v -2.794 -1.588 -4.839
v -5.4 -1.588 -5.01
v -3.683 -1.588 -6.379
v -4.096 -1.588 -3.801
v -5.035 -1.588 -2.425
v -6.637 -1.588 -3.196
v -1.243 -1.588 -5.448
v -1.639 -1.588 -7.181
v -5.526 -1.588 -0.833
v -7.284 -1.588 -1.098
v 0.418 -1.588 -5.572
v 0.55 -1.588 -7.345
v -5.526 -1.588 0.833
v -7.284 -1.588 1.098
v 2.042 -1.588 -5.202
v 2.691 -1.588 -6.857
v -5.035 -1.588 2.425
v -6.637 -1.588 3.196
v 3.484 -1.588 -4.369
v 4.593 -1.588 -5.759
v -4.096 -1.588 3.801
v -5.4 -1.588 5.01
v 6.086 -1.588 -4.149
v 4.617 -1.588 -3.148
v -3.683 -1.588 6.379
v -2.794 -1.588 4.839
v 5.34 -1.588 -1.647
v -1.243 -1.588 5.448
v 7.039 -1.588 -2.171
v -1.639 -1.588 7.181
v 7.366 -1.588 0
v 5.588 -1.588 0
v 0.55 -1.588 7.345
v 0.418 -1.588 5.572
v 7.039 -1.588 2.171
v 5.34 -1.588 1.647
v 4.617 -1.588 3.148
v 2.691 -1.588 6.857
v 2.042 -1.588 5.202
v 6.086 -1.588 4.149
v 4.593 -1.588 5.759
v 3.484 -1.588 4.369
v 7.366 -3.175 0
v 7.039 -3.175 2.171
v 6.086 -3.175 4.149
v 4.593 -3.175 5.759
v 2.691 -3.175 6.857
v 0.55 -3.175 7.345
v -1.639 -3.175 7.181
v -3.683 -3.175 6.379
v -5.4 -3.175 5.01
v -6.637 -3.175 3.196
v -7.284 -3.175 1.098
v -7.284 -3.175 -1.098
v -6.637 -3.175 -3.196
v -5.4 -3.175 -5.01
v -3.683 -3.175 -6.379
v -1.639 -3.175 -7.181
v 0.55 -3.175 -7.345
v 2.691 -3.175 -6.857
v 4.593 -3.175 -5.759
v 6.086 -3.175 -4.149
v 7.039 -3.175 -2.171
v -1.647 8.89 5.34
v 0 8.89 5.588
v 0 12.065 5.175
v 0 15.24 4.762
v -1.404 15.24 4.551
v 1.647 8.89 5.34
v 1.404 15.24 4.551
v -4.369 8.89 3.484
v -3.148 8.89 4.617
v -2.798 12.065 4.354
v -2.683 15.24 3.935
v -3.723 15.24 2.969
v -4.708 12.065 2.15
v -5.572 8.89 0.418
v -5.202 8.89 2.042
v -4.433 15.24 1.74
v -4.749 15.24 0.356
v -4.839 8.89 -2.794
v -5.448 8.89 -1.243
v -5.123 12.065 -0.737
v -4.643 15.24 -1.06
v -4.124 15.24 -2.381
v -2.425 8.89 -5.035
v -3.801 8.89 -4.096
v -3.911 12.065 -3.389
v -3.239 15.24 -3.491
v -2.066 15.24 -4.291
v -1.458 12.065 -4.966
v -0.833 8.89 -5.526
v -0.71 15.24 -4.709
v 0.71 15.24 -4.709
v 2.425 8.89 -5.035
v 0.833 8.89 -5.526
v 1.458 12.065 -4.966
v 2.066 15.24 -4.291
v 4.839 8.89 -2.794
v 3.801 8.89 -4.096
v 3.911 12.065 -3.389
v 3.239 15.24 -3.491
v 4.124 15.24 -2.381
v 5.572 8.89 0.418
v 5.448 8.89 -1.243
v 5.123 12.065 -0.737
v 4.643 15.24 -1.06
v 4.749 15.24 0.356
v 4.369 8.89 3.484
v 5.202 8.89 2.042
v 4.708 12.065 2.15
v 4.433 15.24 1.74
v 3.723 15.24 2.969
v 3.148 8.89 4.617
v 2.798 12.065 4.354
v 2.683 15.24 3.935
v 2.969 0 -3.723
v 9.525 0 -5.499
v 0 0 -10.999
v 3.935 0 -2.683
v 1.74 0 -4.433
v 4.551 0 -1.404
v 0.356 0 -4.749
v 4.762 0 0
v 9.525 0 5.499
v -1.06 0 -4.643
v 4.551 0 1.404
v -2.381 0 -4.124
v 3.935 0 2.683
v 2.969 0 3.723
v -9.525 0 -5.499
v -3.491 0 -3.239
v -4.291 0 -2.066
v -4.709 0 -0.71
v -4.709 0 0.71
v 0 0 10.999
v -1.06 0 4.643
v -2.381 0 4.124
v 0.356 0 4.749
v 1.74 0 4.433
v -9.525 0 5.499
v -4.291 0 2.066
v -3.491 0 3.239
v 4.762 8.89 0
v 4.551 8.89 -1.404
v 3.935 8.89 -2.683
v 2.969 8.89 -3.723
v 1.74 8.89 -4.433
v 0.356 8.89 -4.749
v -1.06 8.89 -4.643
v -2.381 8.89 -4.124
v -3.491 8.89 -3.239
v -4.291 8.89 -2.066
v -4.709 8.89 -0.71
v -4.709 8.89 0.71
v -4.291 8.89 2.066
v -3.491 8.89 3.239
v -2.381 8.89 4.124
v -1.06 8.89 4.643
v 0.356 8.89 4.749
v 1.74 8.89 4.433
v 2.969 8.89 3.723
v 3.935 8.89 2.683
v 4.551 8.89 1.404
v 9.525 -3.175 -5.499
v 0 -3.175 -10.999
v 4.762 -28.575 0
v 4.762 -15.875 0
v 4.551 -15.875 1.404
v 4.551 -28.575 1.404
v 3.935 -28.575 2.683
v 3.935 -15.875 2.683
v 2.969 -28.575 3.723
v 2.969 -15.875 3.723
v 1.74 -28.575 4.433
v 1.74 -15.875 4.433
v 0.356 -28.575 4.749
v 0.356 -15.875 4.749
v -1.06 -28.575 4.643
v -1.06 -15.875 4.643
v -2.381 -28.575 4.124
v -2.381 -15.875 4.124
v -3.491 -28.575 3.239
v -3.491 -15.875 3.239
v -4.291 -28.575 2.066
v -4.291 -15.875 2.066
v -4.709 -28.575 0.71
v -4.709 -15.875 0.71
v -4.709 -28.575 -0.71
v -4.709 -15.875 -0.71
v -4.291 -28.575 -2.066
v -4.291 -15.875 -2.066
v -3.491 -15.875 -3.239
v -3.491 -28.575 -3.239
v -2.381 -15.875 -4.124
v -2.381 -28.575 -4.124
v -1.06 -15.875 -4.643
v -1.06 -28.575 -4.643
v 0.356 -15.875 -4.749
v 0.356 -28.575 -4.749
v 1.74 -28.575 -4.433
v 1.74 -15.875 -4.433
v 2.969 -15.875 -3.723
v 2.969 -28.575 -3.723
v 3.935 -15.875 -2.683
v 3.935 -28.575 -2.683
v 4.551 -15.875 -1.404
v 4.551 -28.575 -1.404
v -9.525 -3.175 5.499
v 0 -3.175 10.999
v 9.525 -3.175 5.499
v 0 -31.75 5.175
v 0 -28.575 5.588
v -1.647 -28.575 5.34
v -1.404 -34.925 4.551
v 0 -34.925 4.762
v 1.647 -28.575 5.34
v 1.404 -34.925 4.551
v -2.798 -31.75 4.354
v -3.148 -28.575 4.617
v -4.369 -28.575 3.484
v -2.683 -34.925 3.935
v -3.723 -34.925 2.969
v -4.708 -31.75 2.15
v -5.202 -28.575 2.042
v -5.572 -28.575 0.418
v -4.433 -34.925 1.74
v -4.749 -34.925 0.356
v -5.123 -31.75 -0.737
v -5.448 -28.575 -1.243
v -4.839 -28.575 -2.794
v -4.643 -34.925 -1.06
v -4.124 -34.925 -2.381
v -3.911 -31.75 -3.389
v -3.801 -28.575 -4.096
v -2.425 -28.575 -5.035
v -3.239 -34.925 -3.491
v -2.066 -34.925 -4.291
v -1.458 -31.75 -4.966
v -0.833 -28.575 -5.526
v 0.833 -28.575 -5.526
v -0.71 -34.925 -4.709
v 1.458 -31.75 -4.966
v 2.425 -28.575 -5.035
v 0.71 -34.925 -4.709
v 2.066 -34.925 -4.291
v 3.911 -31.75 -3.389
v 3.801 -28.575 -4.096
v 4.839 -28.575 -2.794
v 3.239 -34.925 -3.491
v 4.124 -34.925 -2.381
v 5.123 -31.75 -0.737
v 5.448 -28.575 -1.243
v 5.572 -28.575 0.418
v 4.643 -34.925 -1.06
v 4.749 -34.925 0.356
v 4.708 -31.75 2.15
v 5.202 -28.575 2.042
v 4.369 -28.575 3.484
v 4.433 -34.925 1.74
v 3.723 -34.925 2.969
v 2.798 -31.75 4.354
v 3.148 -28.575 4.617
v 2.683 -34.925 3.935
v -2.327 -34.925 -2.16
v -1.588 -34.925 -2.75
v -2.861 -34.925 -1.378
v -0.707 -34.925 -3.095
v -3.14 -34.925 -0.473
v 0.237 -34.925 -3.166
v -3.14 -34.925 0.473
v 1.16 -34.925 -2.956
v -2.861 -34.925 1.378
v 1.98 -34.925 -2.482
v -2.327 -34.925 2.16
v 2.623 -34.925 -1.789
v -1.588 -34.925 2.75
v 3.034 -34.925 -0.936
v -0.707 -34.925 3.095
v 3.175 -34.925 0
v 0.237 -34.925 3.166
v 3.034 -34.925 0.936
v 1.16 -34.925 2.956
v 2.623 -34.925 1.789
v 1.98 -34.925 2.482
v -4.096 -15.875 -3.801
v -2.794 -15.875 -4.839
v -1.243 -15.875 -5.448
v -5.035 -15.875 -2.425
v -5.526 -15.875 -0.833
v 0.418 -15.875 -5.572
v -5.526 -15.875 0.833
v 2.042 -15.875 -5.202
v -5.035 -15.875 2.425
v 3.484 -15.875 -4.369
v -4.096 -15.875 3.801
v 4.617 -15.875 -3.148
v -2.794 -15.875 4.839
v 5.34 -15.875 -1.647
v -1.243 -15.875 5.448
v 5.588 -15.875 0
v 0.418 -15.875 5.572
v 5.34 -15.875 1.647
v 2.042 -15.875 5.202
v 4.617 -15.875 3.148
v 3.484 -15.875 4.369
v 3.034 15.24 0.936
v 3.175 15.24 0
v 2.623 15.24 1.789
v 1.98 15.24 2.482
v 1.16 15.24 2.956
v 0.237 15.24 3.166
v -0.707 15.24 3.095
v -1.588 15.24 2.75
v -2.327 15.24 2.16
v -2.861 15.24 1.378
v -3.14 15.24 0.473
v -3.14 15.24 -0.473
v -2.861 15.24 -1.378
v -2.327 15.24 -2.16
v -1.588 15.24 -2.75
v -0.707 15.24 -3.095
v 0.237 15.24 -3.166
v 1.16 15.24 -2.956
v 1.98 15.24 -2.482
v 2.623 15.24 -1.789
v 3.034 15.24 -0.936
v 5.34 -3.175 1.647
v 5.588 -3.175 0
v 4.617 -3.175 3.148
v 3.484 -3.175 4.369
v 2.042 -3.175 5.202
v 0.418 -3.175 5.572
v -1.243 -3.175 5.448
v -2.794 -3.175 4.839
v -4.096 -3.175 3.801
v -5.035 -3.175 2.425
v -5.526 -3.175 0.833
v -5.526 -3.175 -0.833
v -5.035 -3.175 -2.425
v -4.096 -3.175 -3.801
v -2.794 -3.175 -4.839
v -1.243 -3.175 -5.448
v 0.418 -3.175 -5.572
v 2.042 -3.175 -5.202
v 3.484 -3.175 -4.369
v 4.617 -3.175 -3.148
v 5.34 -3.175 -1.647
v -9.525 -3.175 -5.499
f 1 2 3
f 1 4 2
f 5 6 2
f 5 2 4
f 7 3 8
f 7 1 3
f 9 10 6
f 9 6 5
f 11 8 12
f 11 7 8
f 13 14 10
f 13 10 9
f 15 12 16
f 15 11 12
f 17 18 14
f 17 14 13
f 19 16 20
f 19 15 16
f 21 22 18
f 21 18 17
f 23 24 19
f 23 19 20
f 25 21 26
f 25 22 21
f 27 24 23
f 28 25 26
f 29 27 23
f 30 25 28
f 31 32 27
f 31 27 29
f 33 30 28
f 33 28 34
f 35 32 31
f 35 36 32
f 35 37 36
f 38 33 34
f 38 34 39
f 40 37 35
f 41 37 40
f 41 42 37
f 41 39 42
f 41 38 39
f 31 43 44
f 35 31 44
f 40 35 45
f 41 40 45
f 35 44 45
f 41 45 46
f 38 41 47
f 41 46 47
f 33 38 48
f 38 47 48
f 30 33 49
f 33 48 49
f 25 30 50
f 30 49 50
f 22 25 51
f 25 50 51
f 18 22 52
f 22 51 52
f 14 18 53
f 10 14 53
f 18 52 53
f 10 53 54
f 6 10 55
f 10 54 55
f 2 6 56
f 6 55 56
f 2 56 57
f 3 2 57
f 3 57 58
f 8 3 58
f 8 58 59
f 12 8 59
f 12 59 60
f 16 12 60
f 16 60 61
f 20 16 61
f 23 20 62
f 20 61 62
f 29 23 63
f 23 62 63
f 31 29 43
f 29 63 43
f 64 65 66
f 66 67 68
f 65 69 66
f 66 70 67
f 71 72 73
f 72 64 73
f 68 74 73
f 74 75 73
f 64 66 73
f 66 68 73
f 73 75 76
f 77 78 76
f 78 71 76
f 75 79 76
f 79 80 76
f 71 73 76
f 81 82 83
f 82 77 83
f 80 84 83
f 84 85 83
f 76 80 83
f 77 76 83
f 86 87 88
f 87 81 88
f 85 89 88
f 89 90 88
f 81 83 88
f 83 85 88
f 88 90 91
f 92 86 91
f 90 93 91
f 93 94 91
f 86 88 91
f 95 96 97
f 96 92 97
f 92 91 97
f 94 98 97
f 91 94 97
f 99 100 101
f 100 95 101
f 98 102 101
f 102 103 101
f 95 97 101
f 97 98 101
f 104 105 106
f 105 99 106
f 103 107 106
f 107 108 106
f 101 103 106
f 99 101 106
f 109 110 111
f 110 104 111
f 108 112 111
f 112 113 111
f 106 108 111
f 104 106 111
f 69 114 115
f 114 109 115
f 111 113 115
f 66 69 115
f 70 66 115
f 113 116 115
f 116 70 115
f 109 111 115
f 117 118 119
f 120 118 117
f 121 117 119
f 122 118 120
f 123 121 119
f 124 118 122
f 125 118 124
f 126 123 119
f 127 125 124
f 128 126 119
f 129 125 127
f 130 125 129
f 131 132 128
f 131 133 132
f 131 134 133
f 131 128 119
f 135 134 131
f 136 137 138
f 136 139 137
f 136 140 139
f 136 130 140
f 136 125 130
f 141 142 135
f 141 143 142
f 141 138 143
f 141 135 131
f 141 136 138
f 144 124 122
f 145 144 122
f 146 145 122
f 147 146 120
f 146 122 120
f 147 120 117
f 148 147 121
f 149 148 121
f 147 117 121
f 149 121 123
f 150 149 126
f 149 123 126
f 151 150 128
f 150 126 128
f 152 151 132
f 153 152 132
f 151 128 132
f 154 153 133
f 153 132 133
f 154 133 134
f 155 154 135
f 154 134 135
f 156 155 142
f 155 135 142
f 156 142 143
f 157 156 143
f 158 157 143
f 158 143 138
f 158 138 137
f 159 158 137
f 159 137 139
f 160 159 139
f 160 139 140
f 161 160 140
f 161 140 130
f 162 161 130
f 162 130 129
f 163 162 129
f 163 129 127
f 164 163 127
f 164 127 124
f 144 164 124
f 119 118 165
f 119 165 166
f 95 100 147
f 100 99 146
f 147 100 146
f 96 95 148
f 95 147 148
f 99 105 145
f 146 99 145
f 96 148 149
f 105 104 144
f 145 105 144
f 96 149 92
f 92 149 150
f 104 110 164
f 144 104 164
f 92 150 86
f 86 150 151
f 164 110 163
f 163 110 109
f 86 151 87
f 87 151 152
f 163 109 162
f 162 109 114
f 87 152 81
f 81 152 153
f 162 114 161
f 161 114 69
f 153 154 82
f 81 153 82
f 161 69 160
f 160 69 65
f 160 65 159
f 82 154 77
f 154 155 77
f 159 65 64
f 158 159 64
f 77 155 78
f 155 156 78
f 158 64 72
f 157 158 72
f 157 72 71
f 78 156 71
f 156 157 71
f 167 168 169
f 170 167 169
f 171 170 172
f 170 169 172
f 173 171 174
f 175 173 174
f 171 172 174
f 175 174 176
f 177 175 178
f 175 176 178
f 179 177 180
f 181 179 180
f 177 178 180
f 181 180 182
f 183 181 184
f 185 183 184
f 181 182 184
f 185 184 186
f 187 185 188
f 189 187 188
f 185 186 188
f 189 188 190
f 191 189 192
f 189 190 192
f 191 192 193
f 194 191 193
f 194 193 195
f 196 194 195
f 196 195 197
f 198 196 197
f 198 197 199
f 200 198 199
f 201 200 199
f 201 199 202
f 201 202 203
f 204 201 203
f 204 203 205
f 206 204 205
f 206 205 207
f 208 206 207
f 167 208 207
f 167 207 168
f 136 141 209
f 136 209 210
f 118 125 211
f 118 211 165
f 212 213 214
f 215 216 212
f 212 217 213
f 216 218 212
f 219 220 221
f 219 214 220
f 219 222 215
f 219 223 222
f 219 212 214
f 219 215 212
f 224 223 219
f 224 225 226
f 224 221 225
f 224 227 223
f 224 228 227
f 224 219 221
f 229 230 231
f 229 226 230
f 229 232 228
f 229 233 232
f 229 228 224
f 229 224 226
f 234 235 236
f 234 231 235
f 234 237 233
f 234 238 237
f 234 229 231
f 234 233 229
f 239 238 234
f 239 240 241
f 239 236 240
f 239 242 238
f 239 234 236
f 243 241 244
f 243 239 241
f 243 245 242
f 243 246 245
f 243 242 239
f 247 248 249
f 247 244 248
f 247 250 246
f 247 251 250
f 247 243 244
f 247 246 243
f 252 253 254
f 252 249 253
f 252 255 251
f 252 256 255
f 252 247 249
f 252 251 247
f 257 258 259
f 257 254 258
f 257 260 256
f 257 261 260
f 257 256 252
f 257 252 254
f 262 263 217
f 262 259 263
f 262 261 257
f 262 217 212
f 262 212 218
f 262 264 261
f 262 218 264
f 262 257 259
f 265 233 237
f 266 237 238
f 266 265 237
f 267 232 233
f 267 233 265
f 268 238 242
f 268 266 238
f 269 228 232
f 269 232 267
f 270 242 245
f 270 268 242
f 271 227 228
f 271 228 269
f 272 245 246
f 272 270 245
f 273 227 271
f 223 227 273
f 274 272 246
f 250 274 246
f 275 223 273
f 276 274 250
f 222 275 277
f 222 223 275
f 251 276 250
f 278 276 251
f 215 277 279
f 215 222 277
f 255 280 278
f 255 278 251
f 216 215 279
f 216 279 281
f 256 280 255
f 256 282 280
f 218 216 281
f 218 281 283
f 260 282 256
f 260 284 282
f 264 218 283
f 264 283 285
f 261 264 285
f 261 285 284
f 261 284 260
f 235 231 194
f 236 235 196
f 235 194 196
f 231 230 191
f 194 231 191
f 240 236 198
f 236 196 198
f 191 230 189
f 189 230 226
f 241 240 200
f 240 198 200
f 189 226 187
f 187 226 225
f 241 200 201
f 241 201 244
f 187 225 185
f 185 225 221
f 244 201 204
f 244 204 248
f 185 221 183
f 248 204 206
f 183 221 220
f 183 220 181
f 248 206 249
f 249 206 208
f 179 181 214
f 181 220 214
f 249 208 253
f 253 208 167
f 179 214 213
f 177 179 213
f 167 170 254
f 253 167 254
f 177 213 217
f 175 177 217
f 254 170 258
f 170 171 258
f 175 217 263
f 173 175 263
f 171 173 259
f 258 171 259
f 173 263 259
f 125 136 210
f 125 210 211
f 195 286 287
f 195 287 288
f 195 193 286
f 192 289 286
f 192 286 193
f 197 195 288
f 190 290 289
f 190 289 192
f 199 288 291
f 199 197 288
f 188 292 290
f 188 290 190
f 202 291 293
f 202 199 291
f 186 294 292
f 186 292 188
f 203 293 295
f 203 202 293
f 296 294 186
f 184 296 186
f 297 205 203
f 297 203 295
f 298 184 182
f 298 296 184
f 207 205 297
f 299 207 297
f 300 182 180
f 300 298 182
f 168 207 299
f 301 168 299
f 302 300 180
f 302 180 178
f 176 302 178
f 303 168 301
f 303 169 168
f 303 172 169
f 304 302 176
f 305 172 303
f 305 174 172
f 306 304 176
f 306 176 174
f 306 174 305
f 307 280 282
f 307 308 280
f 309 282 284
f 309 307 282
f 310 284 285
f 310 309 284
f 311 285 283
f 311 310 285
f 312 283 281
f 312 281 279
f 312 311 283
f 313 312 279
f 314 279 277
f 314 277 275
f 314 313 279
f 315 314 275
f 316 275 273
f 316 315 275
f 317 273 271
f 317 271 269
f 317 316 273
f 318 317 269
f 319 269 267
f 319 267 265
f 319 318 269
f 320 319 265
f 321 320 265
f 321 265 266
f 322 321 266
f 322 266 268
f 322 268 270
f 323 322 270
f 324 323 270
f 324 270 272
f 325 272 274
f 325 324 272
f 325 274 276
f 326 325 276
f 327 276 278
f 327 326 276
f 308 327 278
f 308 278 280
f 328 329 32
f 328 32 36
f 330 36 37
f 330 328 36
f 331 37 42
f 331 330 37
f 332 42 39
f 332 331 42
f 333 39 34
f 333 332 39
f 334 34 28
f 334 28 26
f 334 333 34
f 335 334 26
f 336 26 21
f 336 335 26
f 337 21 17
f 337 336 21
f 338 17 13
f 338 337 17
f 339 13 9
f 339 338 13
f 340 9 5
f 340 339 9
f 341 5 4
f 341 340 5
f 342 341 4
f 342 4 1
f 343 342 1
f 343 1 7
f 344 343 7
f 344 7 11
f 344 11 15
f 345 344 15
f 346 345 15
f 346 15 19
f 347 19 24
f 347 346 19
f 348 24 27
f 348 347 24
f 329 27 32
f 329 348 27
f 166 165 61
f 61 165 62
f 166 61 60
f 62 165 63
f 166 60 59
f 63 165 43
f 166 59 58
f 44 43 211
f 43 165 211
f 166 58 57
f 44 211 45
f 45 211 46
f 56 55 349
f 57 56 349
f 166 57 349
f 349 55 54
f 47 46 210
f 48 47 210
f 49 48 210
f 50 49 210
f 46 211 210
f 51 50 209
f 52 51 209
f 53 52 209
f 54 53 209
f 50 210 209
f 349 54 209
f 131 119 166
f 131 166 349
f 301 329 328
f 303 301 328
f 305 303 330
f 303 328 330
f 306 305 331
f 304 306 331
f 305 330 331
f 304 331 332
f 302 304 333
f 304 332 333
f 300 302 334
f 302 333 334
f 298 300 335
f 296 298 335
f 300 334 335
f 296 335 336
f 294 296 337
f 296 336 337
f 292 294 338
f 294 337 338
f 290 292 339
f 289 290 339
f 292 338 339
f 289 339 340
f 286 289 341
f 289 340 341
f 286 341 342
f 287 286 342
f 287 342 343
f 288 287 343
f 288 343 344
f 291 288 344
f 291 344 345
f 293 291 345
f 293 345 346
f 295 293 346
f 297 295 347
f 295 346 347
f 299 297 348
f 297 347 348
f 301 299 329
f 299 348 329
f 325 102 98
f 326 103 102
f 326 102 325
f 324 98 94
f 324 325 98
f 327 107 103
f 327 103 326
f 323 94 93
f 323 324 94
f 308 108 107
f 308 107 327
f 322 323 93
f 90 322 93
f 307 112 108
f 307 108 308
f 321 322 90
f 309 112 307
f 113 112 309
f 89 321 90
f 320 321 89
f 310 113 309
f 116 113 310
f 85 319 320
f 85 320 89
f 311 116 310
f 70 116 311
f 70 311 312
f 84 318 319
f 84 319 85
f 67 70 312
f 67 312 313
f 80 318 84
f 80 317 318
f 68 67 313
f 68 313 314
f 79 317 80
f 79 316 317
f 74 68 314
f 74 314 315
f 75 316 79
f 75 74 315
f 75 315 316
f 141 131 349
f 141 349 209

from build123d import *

# Parameters (mm, degrees)
SKETCH1_R          = 4.7625
SKETCH1_R_2        = 3.175
EXTRUDE1_DEPTH     = 15.24
SKETCH2_R          = 3.175
EXTRUDE2_DEPTH     = 3.175
SKETCH3_R          = 4.7625
SKETCH3_R_2        = 3.175
EXTRUDE3_DEPTH     = 31.75
SKETCH4_R          = 7.366
SKETCH4_R_2        = 5.588
CUT_EXTRUDE1_DEPTH = 1.5875
SKETCH5_R          = 5.588
SKETCH5_R_2        = 4.7625
EXTRUDE4_DEPTH     = 6.35
SKETCH8_R          = 5.588
SKETCH8_R_2        = 4.7625
EXTRUDE5_DEPTH     = 6.35
SKETCH9_R          = 5.588
SKETCH9_R_2        = 4.7625
EXTRUDE6_DEPTH     = 12.7


with BuildPart() as part:
    # Sketch1 → Extrude1 (new body)
    with BuildSketch(Plane(origin=(0, 0, 0), x_dir=(1, 0, 0), z_dir=(0, 1, 0))):
        Circle(SKETCH1_R)
        Circle(SKETCH1_R_2, mode=Mode.SUBTRACT)
    extrude(amount=EXTRUDE1_DEPTH)

    # Sketch2 → Extrude2 (add)
    with BuildSketch(Plane.XZ):
        Polygon((9.525, 5.499261314), (9.525, -5.499261314), (0, -10.998522628), (-9.525, -5.499261314), (-9.525, 5.499261314), (0, 10.998522628), align=None)
        Circle(SKETCH2_R, mode=Mode.SUBTRACT)
    extrude(amount=EXTRUDE2_DEPTH)

    # Sketch3 → Extrude3 (add)
    with BuildSketch(Plane.XZ.offset(3.175)):
        Circle(SKETCH3_R)
        Circle(SKETCH3_R_2, mode=Mode.SUBTRACT)
    extrude(amount=EXTRUDE3_DEPTH)

    # Sketch4 → Cut-Extrude1 (cut)
    with BuildSketch(Plane.XZ.offset(3.175)):
        Circle(SKETCH4_R)
        Circle(SKETCH4_R_2, mode=Mode.SUBTRACT)
    extrude(amount=-CUT_EXTRUDE1_DEPTH, mode=Mode.SUBTRACT)

    # Sketch5 → Extrude4 (add)
    with BuildSketch(Plane(origin=(0, 15.24, 0), x_dir=(-1, 0, 0), z_dir=(0, 1, 0))):
        Circle(SKETCH5_R)
        Circle(SKETCH5_R_2, mode=Mode.SUBTRACT)
    extrude(amount=-EXTRUDE4_DEPTH)

    # Sketch8 → Extrude5 (add)
    with BuildSketch(Plane.XZ.offset(34.925)):
        Circle(SKETCH8_R)
        Circle(SKETCH8_R_2, mode=Mode.SUBTRACT)
    extrude(amount=-EXTRUDE5_DEPTH)

    # Sketch7 → Cut-Revolve1 (revolve, cut)
    with BuildSketch(Plane(origin=(0, 0, 0), x_dir=(0, 0, -1), z_dir=(1, 0, 0))):
        Polygon((-5.588, 8.89), (-4.7625, 15.24), (-5.588, 15.24), align=None)
        Polygon((-5.588, -34.925), (-5.588, -28.575), (-4.7625, -34.925), align=None)
    revolve(axis=Axis((0, 15.24, 0), (0, -1, 0)), mode=Mode.SUBTRACT)

    # Sketch9 → Extrude6 (add)
    with BuildSketch(Plane.XZ.offset(3.175)):
        Circle(SKETCH9_R)
        Circle(SKETCH9_R_2, mode=Mode.SUBTRACT)
    extrude(amount=EXTRUDE6_DEPTH)


solid = part.part
